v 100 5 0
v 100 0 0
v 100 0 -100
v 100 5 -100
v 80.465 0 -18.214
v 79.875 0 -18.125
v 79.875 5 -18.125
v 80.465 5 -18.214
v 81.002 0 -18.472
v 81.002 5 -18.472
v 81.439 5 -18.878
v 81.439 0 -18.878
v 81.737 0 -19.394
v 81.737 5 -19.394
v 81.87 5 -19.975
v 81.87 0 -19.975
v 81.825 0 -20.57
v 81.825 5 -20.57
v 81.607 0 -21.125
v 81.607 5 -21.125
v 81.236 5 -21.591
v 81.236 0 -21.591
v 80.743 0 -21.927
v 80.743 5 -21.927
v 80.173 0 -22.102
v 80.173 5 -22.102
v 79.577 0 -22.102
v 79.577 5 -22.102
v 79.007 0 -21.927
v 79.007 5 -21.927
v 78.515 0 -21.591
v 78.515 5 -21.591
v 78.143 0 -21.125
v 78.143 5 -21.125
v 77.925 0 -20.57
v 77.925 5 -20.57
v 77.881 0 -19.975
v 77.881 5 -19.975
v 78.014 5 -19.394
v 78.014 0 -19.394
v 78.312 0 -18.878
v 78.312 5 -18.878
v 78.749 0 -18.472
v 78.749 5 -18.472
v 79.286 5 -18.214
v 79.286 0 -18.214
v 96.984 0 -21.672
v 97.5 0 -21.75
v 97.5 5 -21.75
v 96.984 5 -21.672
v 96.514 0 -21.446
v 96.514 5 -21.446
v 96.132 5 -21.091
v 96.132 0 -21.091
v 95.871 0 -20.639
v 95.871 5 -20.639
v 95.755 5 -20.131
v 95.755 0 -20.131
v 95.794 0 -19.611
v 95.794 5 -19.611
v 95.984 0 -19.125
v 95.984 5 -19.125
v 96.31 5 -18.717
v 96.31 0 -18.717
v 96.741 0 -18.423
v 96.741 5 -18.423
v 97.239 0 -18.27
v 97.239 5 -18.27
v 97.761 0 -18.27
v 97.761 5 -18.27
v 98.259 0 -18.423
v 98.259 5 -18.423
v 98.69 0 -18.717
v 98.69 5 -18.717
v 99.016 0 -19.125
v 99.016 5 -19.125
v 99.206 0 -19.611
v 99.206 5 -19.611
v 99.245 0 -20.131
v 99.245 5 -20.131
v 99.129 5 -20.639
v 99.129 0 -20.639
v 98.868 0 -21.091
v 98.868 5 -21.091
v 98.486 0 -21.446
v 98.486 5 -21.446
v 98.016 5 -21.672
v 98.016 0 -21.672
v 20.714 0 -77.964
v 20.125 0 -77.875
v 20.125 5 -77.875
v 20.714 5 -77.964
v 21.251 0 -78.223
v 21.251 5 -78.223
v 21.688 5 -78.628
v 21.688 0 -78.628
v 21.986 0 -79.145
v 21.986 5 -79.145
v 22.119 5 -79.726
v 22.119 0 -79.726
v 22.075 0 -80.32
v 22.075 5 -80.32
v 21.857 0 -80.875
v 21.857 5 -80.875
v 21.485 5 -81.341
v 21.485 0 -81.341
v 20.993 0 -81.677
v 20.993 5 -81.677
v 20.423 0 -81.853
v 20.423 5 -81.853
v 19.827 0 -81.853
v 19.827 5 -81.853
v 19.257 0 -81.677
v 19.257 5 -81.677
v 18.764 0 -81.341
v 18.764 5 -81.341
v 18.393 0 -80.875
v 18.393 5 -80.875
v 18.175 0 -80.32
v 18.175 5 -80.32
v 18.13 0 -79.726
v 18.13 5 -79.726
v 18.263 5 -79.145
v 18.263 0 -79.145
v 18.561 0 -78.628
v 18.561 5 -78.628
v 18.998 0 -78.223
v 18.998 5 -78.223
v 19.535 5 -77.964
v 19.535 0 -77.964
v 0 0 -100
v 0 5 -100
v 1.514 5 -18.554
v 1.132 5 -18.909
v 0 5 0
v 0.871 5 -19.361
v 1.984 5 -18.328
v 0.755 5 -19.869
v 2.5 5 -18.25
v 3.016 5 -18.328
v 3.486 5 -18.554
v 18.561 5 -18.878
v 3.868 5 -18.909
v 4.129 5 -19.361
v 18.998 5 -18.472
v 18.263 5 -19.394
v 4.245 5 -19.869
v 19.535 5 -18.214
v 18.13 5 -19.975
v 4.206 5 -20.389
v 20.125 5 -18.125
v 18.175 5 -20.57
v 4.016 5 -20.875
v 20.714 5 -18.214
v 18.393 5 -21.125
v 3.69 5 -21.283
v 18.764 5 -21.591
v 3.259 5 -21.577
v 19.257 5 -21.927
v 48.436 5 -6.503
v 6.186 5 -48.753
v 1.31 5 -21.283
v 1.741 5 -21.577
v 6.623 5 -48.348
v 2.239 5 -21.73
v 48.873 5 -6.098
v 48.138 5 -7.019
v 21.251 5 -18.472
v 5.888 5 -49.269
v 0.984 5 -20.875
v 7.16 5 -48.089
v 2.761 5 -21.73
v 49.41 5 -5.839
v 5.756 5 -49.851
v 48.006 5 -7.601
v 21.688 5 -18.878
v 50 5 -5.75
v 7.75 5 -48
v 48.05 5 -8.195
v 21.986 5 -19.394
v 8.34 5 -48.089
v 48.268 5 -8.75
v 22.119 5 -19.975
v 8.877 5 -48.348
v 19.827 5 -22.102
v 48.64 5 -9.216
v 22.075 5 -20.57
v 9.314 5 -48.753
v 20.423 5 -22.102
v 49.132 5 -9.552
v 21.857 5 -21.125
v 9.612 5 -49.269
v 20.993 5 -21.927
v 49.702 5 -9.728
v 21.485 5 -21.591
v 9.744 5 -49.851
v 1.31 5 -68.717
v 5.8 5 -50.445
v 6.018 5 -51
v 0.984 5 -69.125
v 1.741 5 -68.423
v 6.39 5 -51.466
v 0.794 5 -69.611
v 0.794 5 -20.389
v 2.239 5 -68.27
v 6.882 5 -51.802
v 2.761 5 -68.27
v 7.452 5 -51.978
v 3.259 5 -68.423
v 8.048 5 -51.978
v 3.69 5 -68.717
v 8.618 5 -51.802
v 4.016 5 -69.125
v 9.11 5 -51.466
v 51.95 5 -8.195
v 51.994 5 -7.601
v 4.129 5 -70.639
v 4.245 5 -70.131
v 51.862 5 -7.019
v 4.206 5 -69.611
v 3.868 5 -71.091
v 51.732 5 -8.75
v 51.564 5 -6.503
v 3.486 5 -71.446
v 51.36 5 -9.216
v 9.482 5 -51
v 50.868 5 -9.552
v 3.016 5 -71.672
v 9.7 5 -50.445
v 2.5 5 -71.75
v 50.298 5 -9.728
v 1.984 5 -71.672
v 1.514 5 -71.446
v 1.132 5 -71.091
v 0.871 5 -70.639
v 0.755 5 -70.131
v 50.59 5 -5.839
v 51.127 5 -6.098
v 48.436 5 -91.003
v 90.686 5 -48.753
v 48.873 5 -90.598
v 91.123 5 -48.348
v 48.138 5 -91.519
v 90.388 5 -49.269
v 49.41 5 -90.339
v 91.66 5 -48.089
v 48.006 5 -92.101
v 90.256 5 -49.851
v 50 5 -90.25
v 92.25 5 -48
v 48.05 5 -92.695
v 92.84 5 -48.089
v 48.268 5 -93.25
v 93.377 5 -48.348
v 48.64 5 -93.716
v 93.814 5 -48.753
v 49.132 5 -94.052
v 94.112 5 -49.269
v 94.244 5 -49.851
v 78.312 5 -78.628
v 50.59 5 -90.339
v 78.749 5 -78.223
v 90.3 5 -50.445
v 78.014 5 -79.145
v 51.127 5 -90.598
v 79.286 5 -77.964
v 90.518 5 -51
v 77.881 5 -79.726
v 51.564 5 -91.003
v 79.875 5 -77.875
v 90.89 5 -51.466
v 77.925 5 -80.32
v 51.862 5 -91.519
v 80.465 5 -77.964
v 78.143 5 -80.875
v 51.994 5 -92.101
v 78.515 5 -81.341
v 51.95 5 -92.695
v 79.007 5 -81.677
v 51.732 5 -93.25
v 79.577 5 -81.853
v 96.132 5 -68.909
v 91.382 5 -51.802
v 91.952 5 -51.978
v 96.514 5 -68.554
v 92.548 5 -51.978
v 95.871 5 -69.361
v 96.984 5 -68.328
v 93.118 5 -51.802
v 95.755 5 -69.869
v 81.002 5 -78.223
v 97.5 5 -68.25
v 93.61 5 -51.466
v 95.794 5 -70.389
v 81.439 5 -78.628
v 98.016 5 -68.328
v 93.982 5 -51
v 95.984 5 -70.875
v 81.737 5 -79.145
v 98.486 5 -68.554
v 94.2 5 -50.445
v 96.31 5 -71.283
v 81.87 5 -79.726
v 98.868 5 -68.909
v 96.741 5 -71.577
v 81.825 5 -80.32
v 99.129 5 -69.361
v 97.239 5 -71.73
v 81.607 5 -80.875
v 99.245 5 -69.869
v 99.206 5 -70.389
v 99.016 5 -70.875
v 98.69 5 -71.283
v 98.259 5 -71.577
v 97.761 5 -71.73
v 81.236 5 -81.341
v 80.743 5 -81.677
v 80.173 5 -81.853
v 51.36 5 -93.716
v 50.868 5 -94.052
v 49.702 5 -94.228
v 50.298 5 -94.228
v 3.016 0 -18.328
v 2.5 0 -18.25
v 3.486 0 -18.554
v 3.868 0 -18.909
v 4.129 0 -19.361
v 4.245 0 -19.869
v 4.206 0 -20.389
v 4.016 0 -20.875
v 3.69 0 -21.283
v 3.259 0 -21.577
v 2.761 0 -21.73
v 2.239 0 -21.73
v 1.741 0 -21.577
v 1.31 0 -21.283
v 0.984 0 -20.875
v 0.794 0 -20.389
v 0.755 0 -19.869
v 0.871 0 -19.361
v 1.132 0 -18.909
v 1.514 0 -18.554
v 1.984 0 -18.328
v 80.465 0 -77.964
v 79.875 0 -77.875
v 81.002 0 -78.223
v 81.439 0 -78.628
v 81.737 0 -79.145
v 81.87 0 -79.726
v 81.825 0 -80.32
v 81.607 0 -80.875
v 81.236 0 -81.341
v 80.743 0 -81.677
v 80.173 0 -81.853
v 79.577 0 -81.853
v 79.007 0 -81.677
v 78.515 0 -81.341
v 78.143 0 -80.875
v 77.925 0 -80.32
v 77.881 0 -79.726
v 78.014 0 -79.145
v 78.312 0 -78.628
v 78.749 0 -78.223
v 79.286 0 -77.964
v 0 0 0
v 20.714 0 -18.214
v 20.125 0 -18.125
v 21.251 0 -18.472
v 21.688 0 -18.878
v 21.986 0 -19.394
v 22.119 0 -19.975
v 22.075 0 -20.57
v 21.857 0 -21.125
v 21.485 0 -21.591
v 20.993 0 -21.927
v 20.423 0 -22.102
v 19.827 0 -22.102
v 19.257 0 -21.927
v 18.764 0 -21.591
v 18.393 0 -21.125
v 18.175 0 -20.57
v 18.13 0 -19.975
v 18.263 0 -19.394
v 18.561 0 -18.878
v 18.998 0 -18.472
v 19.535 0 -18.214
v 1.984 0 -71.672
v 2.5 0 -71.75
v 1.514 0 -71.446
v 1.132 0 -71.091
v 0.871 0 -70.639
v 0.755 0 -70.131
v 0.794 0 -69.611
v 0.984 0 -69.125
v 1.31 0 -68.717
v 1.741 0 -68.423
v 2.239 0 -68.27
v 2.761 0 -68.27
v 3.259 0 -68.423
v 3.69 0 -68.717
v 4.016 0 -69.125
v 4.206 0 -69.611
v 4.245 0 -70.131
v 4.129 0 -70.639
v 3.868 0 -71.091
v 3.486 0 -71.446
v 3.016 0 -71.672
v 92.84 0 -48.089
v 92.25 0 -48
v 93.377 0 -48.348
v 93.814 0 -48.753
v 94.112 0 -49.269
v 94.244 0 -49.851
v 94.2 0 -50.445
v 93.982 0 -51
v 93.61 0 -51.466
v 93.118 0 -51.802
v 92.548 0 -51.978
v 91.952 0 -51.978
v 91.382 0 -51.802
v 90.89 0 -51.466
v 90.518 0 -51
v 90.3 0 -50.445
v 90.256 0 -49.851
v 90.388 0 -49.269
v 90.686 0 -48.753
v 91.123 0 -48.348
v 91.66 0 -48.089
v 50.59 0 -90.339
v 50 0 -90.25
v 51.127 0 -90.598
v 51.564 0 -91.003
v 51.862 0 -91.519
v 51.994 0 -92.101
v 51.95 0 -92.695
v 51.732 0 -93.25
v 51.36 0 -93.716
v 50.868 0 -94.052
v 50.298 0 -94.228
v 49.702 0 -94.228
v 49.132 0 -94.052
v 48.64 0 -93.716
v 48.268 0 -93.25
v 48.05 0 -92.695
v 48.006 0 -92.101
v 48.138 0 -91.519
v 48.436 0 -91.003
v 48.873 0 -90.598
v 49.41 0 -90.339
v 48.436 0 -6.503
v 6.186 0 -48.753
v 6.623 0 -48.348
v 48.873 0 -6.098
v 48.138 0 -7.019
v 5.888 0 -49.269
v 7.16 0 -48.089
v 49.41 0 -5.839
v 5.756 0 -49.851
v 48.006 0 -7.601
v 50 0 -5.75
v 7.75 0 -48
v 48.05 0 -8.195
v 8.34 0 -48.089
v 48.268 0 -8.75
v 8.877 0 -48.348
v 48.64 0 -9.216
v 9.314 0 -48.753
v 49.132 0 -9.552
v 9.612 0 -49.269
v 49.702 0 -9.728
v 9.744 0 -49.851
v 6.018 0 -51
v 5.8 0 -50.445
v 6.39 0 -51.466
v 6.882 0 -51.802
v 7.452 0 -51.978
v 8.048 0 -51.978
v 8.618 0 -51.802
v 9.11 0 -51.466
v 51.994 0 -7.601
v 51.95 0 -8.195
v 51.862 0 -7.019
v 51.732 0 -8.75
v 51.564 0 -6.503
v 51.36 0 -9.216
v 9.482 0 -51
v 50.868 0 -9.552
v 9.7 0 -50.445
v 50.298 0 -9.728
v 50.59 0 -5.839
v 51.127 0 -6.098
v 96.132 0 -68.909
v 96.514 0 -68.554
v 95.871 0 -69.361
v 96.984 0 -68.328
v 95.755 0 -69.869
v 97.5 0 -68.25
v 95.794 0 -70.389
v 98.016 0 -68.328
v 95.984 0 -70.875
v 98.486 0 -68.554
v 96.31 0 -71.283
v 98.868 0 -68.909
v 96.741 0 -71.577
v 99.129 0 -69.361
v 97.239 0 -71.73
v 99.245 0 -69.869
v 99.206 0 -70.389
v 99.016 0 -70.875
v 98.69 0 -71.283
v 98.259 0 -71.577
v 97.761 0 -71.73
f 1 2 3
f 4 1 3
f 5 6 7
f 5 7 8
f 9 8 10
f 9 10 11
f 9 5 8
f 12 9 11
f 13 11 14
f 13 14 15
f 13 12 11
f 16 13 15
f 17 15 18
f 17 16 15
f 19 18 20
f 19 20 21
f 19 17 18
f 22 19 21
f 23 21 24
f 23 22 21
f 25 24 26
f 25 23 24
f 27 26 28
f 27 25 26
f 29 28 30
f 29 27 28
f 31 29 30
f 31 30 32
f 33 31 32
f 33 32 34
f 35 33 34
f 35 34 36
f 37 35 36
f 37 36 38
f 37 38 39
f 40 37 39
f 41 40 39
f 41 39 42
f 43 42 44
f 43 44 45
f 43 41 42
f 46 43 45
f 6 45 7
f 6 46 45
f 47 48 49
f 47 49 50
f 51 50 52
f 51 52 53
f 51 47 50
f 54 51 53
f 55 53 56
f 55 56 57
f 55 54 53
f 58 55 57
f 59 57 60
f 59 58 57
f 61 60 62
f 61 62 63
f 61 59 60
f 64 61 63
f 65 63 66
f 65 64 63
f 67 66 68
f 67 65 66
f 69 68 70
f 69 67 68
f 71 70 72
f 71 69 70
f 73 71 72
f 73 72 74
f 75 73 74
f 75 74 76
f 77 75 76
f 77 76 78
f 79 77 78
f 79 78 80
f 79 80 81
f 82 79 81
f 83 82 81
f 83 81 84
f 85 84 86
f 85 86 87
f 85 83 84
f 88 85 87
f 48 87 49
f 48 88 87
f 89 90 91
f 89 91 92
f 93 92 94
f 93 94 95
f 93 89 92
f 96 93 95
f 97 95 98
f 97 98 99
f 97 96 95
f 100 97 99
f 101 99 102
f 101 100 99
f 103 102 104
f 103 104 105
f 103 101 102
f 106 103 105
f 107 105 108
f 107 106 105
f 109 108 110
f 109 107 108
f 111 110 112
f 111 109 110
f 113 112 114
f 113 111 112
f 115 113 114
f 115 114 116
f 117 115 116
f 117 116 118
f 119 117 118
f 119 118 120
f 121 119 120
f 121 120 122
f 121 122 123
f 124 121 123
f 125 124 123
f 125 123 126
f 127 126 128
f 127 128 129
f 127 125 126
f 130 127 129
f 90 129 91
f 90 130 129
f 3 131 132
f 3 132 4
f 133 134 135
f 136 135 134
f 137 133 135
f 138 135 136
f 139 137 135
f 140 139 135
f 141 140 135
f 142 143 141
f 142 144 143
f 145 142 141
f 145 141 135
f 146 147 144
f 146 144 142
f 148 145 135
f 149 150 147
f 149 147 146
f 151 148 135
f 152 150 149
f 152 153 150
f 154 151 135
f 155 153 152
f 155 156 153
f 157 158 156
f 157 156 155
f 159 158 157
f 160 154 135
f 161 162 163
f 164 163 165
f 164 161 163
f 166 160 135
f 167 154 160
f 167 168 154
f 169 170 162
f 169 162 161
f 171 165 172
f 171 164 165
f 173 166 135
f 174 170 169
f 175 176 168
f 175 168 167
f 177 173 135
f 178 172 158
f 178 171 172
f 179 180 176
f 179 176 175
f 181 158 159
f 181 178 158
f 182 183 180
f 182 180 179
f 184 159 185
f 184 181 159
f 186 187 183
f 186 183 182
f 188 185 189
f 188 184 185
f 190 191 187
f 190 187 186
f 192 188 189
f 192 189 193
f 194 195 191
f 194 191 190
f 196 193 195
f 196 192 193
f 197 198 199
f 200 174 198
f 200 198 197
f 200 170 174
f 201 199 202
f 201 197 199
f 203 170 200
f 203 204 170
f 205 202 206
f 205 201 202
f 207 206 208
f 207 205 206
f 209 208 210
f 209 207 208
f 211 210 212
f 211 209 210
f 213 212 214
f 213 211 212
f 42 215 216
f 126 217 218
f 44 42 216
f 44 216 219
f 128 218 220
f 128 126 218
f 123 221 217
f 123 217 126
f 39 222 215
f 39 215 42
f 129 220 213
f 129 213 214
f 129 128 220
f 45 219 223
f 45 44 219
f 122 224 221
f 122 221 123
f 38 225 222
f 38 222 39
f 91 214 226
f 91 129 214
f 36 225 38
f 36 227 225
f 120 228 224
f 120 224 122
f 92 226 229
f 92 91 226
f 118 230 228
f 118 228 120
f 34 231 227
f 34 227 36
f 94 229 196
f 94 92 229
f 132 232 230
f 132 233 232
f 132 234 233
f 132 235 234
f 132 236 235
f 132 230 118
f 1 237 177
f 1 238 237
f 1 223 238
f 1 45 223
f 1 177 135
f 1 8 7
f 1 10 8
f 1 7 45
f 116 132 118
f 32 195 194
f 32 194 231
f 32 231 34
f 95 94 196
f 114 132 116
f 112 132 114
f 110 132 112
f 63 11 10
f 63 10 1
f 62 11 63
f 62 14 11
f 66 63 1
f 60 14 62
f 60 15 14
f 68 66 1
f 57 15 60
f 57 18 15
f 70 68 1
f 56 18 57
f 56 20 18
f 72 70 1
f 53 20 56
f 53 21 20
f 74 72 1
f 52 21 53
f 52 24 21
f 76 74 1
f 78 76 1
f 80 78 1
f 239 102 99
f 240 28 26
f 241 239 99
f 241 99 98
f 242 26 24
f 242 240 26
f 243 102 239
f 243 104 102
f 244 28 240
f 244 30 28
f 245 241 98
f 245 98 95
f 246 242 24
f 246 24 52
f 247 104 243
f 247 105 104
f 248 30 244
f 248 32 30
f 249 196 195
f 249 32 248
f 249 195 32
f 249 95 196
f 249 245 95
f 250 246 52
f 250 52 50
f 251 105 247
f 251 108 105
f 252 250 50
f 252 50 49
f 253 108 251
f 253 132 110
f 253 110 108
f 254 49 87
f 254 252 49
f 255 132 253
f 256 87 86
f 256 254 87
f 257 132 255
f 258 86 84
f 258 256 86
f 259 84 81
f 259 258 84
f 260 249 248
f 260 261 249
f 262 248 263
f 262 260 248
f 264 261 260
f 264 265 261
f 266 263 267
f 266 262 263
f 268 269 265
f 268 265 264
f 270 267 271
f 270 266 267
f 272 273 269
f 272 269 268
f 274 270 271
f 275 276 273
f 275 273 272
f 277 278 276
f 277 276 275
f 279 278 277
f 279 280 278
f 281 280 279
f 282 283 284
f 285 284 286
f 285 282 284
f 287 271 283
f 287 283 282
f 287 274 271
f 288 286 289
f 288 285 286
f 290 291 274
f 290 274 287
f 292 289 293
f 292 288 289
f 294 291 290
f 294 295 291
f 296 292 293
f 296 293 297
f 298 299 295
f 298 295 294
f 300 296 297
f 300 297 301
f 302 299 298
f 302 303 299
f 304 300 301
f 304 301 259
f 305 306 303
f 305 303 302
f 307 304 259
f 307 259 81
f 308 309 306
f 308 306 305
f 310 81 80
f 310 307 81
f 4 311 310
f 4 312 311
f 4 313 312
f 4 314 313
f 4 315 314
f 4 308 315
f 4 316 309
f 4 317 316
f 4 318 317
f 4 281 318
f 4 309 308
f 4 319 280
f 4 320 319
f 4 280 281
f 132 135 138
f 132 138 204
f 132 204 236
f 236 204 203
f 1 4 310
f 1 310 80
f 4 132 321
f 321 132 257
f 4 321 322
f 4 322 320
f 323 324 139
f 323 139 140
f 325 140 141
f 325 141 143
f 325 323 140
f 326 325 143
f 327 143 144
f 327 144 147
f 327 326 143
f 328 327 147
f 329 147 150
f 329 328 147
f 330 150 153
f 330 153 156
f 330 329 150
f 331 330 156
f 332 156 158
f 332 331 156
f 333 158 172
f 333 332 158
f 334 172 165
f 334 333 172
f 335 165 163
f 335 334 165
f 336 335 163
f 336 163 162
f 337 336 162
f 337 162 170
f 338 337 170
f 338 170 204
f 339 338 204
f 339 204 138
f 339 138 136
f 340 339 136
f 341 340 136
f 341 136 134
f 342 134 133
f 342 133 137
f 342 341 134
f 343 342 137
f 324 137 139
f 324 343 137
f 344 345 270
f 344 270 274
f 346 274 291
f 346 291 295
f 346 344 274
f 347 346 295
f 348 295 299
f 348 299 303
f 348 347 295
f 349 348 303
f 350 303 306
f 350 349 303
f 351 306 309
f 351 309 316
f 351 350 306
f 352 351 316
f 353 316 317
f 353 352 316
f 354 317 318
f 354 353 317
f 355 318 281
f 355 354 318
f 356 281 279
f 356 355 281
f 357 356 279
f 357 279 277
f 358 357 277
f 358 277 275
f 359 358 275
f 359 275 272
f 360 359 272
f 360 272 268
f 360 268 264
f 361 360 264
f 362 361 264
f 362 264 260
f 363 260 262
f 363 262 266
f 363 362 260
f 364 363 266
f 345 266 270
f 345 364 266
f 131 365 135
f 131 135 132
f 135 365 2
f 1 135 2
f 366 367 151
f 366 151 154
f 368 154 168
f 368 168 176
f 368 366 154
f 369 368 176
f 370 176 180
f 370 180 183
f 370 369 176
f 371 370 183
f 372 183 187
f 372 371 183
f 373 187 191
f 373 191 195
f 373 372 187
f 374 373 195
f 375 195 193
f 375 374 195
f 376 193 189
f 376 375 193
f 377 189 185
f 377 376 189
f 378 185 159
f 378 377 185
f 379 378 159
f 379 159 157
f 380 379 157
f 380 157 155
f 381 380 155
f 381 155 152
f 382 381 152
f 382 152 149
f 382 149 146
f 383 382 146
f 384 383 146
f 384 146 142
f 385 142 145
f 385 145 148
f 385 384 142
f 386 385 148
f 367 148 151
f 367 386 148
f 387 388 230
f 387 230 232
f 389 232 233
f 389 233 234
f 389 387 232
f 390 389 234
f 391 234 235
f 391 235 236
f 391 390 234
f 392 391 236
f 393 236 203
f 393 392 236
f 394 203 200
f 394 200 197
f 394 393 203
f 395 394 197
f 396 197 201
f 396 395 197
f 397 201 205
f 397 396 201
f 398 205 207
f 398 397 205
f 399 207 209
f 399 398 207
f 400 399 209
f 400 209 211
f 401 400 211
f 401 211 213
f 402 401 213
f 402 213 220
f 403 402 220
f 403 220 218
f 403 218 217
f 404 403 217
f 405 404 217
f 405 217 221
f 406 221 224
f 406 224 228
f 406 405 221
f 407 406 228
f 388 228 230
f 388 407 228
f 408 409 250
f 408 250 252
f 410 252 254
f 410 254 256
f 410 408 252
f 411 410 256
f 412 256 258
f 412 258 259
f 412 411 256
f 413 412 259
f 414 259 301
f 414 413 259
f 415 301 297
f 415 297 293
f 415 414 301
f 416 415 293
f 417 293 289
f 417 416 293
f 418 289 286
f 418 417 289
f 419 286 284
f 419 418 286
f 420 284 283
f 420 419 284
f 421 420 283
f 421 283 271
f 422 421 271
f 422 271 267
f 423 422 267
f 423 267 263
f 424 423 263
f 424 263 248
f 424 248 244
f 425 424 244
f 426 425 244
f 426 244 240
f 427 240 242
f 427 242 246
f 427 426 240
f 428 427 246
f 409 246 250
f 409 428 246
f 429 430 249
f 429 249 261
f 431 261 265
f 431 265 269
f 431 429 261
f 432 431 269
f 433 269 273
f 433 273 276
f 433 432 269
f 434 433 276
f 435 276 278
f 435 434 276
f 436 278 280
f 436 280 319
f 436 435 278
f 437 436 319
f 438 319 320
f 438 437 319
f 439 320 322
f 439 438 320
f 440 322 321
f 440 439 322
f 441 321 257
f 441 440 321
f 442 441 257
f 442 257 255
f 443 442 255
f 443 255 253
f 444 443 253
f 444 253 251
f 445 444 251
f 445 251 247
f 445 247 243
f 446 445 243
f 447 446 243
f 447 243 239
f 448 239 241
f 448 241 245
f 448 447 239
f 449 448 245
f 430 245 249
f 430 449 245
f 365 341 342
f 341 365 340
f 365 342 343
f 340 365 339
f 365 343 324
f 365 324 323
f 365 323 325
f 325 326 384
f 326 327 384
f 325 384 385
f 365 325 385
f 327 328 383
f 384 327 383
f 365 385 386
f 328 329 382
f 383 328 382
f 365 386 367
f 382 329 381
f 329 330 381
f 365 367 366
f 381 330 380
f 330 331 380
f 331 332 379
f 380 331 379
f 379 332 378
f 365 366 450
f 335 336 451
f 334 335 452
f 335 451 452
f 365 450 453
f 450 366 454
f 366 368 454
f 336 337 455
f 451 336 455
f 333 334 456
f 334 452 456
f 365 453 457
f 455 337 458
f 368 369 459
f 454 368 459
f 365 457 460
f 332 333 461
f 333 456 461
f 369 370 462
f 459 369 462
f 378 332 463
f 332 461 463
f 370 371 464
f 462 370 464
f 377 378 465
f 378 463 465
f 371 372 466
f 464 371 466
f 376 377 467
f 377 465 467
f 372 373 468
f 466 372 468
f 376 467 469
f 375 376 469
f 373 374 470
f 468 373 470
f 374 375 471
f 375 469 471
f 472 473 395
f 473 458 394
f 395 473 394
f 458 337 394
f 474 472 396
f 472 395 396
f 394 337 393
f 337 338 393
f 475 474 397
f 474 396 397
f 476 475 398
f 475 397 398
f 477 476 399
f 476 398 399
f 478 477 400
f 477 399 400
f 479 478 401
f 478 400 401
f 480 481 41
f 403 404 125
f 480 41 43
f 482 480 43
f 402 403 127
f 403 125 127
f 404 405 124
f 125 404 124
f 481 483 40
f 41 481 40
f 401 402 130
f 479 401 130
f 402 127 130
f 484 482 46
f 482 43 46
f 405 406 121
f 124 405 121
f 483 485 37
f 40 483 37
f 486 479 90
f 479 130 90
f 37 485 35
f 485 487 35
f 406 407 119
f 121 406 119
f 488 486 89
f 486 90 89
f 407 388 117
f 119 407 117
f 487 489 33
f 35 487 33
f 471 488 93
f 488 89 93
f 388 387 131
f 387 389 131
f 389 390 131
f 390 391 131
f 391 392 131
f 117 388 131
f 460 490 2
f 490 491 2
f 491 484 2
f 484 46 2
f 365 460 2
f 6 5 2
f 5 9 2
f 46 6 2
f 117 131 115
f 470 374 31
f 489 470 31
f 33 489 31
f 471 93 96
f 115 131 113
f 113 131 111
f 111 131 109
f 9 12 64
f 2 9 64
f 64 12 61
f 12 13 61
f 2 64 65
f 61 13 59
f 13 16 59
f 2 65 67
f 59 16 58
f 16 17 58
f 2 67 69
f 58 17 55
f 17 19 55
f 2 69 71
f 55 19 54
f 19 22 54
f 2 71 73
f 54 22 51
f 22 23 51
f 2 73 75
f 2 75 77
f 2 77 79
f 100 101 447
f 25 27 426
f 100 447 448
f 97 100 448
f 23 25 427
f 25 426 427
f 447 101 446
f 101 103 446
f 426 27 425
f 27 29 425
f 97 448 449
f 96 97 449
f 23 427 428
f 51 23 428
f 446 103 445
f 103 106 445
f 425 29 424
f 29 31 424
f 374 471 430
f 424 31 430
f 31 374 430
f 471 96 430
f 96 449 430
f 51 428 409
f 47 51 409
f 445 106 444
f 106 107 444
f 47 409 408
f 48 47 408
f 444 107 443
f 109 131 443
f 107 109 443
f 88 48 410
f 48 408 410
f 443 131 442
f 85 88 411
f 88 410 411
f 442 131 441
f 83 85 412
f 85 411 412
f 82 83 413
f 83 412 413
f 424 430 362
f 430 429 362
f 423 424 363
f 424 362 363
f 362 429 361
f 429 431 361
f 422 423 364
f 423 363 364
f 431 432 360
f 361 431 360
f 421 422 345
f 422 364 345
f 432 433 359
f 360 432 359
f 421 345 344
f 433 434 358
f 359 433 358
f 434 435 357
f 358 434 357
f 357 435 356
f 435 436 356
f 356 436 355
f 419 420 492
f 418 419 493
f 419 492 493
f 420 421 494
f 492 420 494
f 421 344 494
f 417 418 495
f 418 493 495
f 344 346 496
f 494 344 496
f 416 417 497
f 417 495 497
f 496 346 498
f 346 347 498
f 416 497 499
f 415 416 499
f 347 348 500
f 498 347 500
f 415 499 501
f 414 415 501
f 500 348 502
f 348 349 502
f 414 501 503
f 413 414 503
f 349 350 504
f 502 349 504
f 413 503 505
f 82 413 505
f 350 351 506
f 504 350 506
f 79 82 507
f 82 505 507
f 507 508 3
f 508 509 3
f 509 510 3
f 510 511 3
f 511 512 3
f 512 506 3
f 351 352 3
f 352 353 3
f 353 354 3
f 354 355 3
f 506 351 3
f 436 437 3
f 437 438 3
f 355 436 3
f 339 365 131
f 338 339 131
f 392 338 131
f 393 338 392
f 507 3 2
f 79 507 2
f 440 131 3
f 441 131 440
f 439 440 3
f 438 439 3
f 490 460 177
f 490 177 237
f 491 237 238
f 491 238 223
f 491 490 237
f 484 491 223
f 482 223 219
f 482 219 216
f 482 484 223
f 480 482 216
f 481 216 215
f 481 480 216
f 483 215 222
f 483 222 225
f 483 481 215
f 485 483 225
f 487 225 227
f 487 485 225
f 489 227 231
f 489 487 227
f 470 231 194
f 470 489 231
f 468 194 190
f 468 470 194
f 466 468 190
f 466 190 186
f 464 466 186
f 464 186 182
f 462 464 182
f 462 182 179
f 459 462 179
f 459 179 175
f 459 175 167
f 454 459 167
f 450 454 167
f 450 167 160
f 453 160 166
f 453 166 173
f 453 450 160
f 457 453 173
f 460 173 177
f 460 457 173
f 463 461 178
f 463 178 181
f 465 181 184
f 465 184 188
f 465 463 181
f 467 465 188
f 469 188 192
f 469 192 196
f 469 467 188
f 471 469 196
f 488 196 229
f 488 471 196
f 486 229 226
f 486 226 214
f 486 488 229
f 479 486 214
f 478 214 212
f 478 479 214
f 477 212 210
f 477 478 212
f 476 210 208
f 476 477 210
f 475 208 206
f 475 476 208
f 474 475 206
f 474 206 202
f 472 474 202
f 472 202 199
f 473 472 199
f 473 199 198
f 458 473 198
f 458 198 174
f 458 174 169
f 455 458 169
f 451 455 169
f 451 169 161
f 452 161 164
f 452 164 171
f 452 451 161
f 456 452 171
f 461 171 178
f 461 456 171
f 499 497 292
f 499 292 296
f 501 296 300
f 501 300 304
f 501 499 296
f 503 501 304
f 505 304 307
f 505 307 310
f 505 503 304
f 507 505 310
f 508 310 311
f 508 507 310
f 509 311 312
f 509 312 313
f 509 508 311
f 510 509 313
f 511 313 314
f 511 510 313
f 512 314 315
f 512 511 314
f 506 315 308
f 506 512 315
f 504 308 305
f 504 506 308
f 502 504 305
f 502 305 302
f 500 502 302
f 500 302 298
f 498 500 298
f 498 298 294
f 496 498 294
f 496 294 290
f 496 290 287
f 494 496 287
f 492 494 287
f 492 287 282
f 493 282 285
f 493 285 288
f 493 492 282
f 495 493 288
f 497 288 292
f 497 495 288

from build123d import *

# Parameters (mm, degrees)
SKETCH2_W           = 100
SKETCH2_H           = 100
SKETCH2_R           = 2
SKETCH2_R_2         = 1.75
BOSS_EXTRUDE1_DEPTH = 5


with BuildPart() as part:
    # Sketch2 → Boss-Extrude1 (new body)
    with BuildSketch(Plane(origin=(0, 0, 0), x_dir=(1, 0, 0), z_dir=(0, 1, 0))):
        with Locations((50, 50)):
            Rectangle(SKETCH2_W, SKETCH2_H)
        with Locations(Location((50, 92.25, 0), (0, 0, 270))):
            Circle(SKETCH2_R, mode=Mode.SUBTRACT)
        with Locations(Location((79.875261505, 79.875261505, 0), (0, 0, 270))):
            Circle(SKETCH2_R, mode=Mode.SUBTRACT)
        with Locations(Location((92.25, 50, 0), (0, 0, 270))):
            Circle(SKETCH2_R, mode=Mode.SUBTRACT)
        with Locations(Location((79.875261505, 20.124738495, 0), (0, 0, 270))):
            Circle(SKETCH2_R, mode=Mode.SUBTRACT)
        with Locations(Location((50, 7.75, 0), (0, 0, 270))):
            Circle(SKETCH2_R, mode=Mode.SUBTRACT)
        with Locations(Location((20.124738495, 20.124738495, 0), (0, 0, 270))):
            Circle(SKETCH2_R, mode=Mode.SUBTRACT)
        with Locations(Location((7.75, 50, 0), (0, 0, 270))):
            Circle(SKETCH2_R, mode=Mode.SUBTRACT)
        with Locations(Location((20.124738495, 79.875261505, 0), (0, 0, 270))):
            Circle(SKETCH2_R, mode=Mode.SUBTRACT)
        with Locations(Location((2.5, 20, 0), (0, 0, 270))):
            Circle(SKETCH2_R_2, mode=Mode.SUBTRACT)
        with Locations(Location((2.5, 70, 0), (0, 0, 90))):
            Circle(SKETCH2_R_2, mode=Mode.SUBTRACT)
        with Locations(Location((97.5, 20, 0), (0, 0, 90))):
            Circle(SKETCH2_R_2, mode=Mode.SUBTRACT)
        with Locations(Location((97.5, 70, 0), (0, 0, 270))):
            Circle(SKETCH2_R_2, mode=Mode.SUBTRACT)
    extrude(amount=BOSS_EXTRUDE1_DEPTH)


solid = part.part
